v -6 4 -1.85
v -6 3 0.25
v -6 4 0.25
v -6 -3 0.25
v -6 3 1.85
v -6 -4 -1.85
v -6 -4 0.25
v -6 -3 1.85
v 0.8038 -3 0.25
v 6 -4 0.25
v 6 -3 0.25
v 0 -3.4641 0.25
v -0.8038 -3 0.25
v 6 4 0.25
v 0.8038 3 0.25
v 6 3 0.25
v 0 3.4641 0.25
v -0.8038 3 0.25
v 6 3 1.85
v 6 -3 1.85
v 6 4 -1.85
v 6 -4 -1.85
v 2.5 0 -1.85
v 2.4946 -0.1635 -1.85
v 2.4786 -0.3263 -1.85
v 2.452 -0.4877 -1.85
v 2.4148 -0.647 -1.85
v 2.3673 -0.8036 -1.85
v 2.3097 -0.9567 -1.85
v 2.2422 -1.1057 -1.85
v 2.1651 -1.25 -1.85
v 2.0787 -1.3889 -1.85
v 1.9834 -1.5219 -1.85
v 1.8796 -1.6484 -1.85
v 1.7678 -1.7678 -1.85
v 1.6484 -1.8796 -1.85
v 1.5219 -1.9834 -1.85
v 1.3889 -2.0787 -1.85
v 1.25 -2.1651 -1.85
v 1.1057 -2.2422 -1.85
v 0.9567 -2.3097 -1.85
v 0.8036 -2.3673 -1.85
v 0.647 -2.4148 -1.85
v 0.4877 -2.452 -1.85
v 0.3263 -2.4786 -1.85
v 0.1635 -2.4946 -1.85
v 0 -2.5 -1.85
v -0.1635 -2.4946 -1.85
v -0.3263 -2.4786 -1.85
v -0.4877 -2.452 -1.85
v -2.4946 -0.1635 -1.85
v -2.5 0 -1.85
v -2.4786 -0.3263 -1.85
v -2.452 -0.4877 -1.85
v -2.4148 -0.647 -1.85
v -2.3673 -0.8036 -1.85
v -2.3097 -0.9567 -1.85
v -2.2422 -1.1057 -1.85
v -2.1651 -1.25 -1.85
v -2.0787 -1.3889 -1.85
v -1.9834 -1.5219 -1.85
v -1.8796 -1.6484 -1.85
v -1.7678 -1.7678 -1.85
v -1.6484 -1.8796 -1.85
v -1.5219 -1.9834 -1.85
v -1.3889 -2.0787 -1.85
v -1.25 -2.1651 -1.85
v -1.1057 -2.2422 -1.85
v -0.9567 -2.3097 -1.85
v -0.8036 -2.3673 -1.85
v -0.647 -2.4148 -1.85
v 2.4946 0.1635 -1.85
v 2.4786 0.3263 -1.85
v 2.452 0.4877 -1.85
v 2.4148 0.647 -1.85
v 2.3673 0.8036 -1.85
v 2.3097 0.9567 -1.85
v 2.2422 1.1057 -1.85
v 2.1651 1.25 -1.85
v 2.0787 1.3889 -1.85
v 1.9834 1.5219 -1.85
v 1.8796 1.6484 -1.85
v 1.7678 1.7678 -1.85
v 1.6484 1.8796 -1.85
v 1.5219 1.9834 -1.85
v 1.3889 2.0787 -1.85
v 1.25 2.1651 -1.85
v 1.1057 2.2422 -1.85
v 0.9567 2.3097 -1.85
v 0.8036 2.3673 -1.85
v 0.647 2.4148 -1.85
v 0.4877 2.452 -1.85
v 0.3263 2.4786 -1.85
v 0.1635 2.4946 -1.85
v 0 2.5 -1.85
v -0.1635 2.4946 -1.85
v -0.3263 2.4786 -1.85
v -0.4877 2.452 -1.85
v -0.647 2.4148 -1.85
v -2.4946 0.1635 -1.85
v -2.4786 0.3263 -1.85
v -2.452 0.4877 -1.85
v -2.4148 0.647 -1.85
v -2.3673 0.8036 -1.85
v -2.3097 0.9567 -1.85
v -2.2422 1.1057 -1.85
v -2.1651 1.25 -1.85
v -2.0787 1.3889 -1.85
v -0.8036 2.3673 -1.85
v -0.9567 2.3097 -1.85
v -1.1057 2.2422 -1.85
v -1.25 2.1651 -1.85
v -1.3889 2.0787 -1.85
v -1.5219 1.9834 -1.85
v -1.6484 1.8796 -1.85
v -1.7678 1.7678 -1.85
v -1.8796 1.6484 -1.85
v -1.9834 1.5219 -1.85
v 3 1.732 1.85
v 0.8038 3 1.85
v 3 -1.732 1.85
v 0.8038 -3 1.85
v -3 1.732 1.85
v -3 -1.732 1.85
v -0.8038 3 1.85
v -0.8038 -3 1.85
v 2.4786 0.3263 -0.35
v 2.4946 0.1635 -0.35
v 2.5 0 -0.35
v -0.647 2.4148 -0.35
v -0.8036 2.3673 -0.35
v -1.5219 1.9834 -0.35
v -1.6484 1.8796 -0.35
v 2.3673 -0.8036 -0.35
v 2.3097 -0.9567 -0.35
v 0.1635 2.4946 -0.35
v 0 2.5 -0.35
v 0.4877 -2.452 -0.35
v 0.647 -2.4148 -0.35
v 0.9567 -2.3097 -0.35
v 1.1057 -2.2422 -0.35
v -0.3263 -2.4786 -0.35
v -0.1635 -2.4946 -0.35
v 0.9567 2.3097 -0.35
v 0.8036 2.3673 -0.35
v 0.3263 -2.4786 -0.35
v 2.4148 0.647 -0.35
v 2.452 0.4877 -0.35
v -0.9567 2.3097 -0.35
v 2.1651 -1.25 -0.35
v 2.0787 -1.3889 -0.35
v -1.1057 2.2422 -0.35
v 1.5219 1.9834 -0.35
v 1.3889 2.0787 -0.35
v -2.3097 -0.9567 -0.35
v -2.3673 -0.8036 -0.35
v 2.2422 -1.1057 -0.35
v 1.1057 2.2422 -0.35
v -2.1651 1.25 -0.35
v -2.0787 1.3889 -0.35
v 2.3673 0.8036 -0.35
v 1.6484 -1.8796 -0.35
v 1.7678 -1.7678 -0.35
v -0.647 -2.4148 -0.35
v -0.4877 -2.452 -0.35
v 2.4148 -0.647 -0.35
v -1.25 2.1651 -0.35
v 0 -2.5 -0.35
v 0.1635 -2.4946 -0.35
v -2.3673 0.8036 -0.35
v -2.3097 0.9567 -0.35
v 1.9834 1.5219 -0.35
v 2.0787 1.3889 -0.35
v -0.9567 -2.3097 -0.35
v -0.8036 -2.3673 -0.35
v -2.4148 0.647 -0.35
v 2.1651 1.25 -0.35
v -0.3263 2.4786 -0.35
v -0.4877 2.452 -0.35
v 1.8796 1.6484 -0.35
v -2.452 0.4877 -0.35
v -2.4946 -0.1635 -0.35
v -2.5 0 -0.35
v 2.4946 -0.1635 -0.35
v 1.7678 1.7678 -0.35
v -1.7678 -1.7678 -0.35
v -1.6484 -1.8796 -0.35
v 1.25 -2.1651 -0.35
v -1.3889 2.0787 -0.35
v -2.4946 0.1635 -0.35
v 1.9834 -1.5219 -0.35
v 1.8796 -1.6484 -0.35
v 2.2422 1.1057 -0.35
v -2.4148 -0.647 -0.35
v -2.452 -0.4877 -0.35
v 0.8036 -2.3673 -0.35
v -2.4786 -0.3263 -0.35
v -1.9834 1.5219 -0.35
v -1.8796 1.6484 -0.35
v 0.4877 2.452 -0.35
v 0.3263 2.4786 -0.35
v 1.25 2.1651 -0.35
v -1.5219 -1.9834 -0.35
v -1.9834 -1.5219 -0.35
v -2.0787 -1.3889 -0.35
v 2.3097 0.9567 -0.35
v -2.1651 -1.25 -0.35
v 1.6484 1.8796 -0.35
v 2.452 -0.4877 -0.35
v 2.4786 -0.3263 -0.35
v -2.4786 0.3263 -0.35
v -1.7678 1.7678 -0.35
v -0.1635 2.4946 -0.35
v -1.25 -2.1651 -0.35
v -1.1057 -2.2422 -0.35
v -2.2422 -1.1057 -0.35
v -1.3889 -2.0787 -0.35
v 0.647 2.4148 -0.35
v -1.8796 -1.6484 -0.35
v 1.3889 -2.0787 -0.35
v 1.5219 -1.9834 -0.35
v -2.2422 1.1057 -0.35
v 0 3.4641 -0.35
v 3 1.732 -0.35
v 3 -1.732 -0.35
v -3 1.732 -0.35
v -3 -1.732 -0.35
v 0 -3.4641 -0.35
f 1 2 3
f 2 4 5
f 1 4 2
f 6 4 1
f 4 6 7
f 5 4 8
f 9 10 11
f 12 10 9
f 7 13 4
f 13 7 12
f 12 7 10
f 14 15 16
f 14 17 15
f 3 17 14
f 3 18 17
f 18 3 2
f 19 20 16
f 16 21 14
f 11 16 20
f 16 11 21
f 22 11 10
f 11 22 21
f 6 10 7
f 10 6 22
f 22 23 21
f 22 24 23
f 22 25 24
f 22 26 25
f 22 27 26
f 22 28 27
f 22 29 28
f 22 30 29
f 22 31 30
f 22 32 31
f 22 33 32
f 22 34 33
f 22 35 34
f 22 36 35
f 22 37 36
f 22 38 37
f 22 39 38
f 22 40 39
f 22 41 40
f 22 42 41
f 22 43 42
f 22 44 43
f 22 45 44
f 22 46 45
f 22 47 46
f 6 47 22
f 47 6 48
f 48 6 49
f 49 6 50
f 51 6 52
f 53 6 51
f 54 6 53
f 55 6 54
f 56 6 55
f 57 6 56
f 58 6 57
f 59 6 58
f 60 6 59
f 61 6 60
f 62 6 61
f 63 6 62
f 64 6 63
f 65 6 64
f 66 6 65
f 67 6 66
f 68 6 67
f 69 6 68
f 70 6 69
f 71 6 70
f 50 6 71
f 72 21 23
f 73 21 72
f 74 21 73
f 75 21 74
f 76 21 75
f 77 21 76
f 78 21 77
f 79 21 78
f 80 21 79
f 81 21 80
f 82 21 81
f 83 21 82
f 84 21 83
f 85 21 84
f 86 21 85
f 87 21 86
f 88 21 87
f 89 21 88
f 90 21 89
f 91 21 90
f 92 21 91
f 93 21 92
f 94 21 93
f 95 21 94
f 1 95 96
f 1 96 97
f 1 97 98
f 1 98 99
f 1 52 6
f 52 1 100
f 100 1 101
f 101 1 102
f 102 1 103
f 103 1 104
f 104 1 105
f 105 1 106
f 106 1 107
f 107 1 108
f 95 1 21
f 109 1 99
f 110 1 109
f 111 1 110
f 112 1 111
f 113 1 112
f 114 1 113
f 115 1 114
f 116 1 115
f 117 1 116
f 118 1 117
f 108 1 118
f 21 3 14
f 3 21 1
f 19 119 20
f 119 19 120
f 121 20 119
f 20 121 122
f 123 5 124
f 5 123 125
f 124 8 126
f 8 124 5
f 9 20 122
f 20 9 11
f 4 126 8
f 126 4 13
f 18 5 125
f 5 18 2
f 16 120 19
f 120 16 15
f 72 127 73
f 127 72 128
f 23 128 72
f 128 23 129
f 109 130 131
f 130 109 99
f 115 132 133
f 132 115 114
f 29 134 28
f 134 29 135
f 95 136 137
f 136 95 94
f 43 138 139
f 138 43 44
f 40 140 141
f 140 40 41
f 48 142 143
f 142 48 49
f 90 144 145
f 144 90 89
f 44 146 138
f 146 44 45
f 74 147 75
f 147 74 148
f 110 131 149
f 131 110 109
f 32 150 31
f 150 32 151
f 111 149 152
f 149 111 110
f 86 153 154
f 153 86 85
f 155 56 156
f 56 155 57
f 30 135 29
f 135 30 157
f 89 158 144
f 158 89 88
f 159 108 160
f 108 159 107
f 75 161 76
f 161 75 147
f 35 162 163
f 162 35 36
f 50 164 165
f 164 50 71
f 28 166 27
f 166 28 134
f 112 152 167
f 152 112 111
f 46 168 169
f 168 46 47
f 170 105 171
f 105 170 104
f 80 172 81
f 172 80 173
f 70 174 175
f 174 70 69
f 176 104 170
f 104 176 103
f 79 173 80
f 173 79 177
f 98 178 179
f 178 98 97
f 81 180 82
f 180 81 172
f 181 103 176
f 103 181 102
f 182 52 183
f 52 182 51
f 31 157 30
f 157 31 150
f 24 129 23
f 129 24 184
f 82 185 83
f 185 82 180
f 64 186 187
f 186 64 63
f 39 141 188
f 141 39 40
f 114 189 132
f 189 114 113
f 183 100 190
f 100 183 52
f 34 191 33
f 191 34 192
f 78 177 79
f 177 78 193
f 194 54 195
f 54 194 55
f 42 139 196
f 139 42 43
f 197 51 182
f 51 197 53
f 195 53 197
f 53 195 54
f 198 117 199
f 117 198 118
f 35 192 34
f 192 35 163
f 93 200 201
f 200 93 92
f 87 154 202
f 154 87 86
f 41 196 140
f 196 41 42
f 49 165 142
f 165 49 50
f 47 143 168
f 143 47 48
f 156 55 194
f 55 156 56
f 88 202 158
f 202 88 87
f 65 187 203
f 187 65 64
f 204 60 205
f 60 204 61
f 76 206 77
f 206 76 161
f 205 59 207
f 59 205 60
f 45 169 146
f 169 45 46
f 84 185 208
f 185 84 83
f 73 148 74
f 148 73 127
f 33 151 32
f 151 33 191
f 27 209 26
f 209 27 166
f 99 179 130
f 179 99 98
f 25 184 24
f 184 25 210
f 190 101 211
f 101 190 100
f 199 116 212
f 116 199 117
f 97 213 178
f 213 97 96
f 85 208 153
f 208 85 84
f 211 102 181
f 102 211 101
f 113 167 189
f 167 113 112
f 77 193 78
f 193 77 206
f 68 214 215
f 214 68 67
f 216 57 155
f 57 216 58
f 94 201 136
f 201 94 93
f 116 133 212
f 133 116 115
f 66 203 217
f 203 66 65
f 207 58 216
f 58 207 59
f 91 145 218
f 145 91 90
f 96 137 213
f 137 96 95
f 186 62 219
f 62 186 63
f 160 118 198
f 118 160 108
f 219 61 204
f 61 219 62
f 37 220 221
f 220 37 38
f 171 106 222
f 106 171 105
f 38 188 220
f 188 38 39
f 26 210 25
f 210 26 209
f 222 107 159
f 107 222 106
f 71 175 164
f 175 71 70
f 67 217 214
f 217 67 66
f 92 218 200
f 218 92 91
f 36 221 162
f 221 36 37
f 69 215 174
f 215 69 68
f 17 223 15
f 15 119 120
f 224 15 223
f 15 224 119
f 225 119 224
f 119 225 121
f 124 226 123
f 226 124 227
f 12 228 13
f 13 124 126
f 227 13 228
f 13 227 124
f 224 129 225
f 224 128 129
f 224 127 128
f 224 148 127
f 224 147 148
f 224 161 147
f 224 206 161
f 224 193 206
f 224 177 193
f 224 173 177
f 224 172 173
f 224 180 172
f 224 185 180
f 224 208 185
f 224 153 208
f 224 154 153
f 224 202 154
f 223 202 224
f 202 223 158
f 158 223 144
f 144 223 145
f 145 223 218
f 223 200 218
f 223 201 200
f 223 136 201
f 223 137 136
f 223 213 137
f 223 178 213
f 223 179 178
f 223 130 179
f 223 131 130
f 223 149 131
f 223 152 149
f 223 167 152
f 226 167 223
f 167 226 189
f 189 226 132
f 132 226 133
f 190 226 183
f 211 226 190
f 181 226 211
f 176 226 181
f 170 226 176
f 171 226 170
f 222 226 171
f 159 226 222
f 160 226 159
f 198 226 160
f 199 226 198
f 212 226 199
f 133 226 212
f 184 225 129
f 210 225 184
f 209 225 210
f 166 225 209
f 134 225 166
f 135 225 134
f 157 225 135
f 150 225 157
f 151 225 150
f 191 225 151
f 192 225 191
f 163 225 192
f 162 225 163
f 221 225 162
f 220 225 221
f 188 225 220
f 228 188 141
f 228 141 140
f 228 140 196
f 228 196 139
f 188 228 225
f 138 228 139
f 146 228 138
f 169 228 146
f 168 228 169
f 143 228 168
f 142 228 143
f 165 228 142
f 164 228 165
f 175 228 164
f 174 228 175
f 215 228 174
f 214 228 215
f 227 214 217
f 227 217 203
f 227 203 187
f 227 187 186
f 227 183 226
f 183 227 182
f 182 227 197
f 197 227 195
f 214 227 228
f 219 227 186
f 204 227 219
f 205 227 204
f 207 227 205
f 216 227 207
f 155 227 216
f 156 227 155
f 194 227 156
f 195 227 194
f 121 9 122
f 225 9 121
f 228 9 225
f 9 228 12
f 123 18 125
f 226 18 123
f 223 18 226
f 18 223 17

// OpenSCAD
// T-slot nut (sliding rectangular body) for 5.0mm screw, 6.0mm AF hex recess, 3.7mm thick
$fn = 96;

// --- Requested dimensions ---
nut_af        = 6.0;   // across flats (hex recess)
nut_thickness = 3.7;   // overall thickness (Z)
screw_d       = 5.0;   // clearance hole for screw

// --- T-slot nut body (T-profile) ---
body_len = 12.0;       // along slot (X)
body_w   = 8.0;        // base width (Y) - wider part that captures under slot lips
body_h   = nut_thickness;

neck_w   = 6.0;        // neck width (Y) - fits slot opening
neck_h   = 1.6;        // neck height (Z) - top portion

// --- Details ---
eps = 0.02;
edge_bevel = 0.35;

// Hex recess depth (must be <= thickness)
hex_recess_depth = 2.2;

// --- Helpers ---
function hex_points_from_af(af) =
    let(r = af / sqrt(3))  // circumradius for given across-flats
    [ for (i = [0:5]) [ r*cos(60*i + 30), r*sin(60*i + 30) ] ];

module hex_prism_from_af(af, h, center=false) {
    linear_extrude(height=h, center=center)
        polygon(points = hex_points_from_af(af));
}

module beveled_block(size=[10,10,3], bevel=0.3) {
    sx = size[0]; sy = size[1]; sz = size[2];
    b  = min(bevel, min(sx,sy,sz)/4);

    hull() {
        translate([0,0, b/2])
            cube([sx, sy, sz-b], center=true);
        translate([0,0,-b/2])
            cube([sx, sy, sz-b], center=true);
    }
}

// --- Main model ---
module t_slot_nut() {
    // Ensure a true T-profile: base is wider than neck
    assert(body_w > neck_w, "body_w must be > neck_w to form a T-slot nut profile.");
    assert(neck_h > 0 && neck_h < body_h, "neck_h must be > 0 and < body_h.");
    assert(hex_recess_depth > 0 && hex_recess_depth <= body_h, "hex_recess_depth must be <= body_h.");

    base_h = body_h - neck_h;

    difference() {
        // ONE connected solid: wide base + narrow neck (connected with slight overlap)
        union() {
            // Base (bottom)
            translate([0,0, -body_h/2 + base_h/2])
                beveled_block([body_len, body_w, base_h], edge_bevel);

            // Neck (top), overlaps into base by eps to guarantee connectivity
            translate([0,0, body_h/2 - neck_h/2 - eps/2])
                beveled_block([body_len, neck_w, neck_h + eps], edge_bevel);
        }

        // Through hole for 5.0mm screw (clearance)
        cylinder(h = body_h + 2, d = screw_d, center=true);

        // Hex recess on top face (6.0mm AF), does not break through bottom
        translate([0,0, body_h/2 - hex_recess_depth/2 + eps])
            hex_prism_from_af(nut_af, hex_recess_depth + 2*eps, center=true);
    }
}

t_slot_nut();
